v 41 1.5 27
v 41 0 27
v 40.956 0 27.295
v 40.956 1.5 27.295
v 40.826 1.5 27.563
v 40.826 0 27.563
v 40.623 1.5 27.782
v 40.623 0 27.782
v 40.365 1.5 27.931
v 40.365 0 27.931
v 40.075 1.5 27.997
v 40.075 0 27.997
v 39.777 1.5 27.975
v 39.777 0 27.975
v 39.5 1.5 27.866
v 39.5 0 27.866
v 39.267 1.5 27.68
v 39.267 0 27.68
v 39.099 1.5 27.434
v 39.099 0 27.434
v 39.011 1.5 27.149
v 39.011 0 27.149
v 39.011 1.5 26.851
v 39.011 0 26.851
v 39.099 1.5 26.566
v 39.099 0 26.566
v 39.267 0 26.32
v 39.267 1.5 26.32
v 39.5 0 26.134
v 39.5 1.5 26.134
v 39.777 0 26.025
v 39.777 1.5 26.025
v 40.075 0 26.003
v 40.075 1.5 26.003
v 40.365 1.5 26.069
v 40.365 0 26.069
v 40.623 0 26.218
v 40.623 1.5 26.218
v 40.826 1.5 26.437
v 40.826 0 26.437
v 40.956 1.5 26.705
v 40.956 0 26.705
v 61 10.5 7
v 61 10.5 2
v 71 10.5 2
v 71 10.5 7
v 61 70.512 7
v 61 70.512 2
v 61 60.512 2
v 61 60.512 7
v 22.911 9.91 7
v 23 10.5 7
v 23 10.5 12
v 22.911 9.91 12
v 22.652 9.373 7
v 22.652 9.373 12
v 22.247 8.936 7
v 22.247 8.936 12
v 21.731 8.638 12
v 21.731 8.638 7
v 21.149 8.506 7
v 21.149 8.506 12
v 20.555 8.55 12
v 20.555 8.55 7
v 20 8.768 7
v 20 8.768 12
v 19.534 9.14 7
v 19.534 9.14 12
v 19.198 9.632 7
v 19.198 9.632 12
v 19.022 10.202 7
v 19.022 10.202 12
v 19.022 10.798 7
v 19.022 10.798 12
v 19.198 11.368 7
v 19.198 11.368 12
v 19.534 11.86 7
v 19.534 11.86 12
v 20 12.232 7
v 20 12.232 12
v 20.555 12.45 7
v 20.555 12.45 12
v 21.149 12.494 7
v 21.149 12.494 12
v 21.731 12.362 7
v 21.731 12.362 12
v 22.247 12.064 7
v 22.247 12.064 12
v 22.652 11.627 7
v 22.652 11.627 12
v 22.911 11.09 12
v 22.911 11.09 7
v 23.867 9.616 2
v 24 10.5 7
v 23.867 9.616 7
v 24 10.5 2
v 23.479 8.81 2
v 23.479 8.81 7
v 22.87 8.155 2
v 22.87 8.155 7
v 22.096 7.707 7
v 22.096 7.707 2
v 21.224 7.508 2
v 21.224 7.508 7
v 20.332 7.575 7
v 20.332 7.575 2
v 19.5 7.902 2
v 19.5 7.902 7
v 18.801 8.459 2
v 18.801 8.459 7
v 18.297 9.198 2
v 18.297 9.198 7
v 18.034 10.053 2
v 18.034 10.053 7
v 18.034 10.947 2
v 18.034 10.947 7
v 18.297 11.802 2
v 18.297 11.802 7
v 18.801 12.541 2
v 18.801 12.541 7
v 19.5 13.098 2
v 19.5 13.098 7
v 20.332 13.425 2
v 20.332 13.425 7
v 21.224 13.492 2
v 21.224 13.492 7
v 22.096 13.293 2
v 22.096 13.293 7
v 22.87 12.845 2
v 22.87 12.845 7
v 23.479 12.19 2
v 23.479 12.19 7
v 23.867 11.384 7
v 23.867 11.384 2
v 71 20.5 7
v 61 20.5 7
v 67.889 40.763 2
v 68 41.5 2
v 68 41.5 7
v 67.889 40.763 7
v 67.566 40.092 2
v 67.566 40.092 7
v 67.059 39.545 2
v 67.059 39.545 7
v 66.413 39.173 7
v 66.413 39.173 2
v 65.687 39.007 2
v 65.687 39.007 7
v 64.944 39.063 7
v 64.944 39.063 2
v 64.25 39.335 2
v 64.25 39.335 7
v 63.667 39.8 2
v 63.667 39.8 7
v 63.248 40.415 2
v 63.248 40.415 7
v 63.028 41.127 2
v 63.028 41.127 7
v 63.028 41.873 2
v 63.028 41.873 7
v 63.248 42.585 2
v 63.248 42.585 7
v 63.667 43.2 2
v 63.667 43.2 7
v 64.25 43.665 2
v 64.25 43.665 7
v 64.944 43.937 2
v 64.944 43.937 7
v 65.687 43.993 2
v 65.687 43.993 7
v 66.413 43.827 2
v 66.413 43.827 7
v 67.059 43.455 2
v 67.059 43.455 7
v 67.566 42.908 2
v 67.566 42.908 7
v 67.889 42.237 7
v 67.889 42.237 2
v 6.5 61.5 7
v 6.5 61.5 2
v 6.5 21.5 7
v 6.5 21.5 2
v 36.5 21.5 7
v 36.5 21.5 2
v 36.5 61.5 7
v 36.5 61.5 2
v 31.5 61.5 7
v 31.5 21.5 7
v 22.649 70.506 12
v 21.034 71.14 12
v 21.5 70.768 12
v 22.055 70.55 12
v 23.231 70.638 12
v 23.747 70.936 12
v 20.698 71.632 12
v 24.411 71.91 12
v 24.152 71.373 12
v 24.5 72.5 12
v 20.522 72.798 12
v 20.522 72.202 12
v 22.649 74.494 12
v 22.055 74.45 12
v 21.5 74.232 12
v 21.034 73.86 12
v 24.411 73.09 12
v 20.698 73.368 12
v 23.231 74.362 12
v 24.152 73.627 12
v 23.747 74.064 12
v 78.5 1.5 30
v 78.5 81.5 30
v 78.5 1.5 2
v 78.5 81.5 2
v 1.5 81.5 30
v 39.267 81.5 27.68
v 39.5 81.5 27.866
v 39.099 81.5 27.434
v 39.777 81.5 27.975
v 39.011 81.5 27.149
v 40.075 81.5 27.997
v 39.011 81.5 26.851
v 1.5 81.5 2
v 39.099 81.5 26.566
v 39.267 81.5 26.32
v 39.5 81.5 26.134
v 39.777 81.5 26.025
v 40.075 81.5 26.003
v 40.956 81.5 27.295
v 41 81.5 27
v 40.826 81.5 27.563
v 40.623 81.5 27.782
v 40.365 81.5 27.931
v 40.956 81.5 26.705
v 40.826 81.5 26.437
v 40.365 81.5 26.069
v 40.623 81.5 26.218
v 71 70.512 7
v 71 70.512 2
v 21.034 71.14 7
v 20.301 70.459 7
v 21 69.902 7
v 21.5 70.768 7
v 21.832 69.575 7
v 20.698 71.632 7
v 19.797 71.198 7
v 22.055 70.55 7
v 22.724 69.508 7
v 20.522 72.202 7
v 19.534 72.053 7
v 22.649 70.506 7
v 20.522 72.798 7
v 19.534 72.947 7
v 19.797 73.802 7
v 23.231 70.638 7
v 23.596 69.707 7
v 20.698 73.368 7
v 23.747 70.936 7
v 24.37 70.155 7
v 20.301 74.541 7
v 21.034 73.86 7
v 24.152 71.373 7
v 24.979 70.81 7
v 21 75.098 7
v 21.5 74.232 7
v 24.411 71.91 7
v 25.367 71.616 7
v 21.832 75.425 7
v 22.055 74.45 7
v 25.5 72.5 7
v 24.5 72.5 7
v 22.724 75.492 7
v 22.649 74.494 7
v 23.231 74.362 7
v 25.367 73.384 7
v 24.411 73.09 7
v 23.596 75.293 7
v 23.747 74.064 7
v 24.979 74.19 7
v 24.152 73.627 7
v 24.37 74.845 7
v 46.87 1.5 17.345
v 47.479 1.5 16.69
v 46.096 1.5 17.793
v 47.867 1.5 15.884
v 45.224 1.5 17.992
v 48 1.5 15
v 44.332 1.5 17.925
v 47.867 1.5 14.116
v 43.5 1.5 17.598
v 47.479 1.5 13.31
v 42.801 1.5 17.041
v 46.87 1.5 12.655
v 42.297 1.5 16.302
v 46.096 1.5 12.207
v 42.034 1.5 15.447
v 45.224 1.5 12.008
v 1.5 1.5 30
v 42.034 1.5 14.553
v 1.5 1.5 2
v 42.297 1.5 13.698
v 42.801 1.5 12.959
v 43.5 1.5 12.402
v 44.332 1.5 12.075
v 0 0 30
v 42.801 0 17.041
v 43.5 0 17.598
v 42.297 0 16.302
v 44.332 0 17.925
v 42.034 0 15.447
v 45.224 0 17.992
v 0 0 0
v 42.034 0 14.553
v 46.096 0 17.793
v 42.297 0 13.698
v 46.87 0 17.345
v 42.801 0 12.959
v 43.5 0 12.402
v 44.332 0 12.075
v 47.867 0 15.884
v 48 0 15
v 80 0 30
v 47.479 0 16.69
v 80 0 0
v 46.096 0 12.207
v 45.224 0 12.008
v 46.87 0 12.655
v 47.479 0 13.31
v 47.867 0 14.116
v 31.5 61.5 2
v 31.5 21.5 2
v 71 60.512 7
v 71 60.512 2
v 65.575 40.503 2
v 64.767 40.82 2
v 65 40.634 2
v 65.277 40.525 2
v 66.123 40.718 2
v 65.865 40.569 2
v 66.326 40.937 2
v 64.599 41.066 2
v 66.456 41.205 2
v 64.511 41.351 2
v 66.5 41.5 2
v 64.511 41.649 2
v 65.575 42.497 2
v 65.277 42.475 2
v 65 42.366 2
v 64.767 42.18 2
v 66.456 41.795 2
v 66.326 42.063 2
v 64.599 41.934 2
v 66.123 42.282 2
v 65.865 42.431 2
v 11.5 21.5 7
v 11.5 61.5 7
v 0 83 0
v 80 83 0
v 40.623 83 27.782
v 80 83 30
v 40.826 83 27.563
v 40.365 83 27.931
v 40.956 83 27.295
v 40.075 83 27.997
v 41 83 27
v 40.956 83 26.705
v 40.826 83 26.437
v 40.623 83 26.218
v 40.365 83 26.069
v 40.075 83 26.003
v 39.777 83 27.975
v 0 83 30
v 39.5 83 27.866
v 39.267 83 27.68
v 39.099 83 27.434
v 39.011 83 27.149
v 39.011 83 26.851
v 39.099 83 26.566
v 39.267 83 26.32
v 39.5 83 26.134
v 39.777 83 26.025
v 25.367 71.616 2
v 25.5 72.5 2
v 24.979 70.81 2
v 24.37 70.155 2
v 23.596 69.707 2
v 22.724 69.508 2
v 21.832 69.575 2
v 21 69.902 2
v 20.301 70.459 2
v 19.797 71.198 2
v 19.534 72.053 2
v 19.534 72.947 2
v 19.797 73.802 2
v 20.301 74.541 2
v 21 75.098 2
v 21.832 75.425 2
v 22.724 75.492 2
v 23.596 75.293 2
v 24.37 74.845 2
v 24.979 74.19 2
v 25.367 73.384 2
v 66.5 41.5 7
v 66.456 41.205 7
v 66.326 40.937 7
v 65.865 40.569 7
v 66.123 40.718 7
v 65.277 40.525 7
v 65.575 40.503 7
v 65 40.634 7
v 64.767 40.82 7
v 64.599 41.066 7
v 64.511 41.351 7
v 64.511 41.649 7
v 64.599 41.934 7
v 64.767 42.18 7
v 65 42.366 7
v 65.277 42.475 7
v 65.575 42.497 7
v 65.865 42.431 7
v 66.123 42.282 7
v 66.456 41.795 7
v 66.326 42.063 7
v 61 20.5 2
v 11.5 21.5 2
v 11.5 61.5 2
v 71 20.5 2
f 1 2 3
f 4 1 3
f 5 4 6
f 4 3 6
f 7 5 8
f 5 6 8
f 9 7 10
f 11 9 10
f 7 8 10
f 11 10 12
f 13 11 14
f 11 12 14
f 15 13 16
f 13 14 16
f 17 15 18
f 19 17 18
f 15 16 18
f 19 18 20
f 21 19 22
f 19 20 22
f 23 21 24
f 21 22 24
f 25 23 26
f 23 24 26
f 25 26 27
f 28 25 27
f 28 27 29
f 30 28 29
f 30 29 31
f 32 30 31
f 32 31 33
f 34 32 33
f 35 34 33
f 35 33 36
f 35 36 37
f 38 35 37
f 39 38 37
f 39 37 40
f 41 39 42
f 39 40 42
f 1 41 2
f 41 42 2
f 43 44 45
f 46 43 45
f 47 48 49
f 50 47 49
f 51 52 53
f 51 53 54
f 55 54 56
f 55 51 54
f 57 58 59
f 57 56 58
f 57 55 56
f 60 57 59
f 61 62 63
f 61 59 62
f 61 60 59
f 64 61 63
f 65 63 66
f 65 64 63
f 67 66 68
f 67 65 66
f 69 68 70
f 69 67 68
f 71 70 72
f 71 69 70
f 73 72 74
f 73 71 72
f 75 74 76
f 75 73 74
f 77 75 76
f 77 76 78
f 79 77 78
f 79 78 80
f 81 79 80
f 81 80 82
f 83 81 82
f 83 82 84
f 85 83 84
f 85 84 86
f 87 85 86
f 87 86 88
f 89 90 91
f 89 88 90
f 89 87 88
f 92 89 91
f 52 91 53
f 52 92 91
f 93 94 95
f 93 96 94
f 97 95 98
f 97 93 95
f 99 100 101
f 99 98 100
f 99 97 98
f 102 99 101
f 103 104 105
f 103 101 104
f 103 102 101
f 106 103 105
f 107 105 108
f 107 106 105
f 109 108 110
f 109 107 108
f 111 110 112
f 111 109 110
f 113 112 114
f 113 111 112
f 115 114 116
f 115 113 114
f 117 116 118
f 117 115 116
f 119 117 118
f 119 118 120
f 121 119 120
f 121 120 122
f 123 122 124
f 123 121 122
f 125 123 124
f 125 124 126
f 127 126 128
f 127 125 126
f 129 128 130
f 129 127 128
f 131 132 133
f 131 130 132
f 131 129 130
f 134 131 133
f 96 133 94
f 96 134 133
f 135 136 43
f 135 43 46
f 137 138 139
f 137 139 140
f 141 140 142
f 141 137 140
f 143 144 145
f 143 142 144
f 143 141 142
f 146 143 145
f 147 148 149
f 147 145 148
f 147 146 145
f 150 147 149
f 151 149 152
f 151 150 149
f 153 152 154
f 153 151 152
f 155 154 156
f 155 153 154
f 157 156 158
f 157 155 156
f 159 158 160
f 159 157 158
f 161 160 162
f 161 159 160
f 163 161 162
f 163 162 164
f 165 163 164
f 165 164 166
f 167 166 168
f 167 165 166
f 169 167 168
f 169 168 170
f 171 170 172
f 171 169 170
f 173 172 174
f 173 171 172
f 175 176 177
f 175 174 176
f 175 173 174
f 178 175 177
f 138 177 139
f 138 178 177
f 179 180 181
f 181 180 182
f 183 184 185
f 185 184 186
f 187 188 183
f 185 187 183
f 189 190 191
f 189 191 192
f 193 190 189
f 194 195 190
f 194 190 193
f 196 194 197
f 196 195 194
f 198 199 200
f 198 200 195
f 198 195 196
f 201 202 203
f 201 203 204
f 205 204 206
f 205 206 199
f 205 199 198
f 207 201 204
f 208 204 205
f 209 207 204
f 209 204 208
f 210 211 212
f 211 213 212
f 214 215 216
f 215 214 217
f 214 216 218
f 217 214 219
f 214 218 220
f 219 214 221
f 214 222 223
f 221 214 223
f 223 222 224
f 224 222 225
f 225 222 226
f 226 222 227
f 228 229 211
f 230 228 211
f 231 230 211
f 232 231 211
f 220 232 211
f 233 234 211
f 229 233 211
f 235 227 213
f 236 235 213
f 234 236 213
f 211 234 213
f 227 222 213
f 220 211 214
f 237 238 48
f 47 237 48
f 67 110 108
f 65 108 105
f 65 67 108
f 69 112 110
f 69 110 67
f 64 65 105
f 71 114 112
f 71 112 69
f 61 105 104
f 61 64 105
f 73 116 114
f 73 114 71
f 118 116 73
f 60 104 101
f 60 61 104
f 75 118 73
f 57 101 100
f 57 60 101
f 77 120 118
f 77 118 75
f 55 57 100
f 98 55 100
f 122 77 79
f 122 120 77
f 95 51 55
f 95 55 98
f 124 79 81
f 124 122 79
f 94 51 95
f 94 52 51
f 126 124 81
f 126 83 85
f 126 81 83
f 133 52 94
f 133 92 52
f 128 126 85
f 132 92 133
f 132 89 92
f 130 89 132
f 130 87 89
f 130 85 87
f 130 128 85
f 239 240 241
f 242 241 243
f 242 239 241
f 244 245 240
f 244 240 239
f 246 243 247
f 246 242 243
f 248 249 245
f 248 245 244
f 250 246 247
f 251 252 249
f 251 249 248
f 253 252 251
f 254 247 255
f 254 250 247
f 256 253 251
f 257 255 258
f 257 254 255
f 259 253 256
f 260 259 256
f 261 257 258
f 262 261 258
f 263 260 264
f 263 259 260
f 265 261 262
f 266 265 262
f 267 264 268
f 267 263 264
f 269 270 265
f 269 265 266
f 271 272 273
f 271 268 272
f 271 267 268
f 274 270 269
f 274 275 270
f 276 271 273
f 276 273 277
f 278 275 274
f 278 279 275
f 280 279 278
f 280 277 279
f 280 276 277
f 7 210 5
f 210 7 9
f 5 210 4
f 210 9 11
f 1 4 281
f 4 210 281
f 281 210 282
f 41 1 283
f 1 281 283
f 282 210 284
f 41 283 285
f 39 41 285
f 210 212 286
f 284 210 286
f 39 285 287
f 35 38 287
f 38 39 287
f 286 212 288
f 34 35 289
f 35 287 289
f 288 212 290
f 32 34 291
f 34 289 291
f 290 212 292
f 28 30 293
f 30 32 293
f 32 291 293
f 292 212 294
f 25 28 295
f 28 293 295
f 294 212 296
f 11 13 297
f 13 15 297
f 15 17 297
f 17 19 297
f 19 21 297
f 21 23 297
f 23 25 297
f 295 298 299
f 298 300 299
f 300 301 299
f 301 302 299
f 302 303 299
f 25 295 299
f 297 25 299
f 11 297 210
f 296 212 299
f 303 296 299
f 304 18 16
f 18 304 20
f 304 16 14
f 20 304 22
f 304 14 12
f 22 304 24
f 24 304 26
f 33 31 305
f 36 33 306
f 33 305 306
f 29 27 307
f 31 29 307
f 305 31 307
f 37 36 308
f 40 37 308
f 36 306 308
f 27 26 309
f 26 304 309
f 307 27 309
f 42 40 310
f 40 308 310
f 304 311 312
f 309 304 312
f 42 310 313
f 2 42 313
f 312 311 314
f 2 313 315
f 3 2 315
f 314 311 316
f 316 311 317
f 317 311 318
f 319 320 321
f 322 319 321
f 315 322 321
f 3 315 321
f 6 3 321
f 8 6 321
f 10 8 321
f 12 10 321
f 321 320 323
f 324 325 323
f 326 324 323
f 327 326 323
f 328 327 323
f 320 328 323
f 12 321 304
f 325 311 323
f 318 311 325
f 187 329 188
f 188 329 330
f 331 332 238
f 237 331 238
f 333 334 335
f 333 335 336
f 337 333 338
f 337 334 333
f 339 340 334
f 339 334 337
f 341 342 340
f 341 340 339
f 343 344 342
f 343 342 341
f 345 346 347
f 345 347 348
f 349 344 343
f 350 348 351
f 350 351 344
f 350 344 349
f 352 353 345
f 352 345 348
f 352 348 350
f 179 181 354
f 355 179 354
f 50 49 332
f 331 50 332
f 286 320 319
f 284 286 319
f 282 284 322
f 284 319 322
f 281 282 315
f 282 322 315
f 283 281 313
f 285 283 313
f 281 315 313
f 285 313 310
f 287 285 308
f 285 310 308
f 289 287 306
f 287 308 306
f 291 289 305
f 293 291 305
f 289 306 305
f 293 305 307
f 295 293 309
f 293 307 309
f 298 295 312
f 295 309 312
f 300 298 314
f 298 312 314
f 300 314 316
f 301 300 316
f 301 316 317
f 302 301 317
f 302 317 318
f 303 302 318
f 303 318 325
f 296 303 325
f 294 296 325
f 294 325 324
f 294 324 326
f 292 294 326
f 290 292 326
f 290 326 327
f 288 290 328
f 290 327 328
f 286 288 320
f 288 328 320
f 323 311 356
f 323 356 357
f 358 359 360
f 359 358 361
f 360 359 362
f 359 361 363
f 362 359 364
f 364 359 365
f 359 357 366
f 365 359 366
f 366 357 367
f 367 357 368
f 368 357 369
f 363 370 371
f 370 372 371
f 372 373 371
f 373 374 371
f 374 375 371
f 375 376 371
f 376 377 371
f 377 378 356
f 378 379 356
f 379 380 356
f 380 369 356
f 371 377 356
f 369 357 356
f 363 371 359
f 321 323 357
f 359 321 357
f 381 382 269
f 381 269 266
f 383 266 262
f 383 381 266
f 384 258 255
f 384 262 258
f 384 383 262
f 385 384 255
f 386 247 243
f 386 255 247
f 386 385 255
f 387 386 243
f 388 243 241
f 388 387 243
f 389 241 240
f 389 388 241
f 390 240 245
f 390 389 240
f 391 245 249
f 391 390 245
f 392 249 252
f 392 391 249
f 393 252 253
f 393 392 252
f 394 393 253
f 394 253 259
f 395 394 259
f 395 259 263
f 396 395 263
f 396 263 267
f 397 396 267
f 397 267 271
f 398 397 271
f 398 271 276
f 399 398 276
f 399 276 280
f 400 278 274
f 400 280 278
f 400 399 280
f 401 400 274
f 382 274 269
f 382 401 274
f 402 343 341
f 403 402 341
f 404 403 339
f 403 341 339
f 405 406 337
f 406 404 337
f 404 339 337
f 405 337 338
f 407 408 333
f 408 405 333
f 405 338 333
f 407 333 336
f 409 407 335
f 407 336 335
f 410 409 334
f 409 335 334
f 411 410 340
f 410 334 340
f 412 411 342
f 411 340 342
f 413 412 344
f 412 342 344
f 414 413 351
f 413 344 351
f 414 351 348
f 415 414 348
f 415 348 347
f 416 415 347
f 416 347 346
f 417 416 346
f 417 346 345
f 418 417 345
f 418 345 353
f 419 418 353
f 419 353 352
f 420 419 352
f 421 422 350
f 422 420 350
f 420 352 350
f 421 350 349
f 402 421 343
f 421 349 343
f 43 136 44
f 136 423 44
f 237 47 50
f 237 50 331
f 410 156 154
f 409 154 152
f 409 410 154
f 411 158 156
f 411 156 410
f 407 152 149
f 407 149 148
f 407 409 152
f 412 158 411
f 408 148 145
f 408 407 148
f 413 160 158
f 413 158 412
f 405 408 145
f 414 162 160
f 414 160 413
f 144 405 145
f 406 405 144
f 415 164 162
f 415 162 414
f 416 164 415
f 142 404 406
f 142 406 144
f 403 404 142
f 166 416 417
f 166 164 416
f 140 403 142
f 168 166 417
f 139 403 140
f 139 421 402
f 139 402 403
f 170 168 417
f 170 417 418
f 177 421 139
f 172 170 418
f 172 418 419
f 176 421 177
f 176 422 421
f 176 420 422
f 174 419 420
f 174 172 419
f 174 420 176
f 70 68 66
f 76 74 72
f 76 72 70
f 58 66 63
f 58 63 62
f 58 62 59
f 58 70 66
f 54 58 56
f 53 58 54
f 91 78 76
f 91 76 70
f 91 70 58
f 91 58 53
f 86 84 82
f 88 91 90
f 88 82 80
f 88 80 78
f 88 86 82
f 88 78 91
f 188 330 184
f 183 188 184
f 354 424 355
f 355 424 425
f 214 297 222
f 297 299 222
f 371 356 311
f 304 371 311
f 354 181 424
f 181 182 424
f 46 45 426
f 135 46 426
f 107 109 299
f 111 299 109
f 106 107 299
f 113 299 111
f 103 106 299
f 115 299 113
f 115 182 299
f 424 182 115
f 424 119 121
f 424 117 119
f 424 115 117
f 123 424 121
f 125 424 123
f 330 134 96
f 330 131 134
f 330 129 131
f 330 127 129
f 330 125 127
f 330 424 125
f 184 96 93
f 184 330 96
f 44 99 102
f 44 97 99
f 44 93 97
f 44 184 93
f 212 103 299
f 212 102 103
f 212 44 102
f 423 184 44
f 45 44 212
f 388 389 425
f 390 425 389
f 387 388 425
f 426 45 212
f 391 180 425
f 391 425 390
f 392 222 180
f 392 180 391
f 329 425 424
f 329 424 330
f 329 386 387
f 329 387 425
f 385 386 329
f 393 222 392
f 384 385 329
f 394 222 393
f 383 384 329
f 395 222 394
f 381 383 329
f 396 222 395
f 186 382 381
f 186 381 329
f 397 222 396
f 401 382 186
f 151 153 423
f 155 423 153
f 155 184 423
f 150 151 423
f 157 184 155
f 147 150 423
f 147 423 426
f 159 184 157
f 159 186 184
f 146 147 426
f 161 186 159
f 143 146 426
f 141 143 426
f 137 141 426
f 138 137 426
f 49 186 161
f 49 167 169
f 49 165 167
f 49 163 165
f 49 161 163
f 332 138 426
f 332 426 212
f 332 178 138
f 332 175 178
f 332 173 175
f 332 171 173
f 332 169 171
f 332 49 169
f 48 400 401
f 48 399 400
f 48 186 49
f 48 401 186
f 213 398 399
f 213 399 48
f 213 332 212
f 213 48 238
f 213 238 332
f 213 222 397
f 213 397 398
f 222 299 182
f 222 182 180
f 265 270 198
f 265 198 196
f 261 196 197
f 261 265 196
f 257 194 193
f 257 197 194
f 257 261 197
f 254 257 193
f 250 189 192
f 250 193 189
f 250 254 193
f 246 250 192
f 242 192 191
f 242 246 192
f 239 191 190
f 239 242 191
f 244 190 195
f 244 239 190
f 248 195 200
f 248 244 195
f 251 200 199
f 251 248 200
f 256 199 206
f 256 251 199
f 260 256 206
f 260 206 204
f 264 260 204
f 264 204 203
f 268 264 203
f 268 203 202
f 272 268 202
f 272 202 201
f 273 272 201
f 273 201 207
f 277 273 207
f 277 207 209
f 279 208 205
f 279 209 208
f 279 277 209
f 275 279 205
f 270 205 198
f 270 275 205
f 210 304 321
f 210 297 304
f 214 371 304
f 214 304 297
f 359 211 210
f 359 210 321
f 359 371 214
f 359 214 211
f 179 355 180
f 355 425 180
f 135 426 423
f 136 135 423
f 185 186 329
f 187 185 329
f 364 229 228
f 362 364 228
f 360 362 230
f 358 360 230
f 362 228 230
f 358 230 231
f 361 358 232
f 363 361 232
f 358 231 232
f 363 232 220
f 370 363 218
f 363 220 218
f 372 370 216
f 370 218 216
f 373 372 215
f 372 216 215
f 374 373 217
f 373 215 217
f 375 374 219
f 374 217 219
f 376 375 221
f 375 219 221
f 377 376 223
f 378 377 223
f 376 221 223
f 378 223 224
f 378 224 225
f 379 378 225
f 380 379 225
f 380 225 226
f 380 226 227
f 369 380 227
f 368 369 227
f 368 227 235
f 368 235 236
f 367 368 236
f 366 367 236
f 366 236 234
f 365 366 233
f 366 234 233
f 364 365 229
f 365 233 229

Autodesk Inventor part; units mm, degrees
ref_plane "YZ Plane" through (0, 0, 0) normal (1, 0, 0) x (0, 1, 0)
ref_plane "XZ Plane" through (0, 0, 0) normal (0, 1, 0) x (-1, 0, 0)
ref_plane "XY Plane" through (0, 0, 0) normal (0, 0, 1) x (1, 0, 0)
sketch "Skizze1" plane through (0, 0, 0) normal (0, 0, 1) x (1, 0, 0)
  line L0 (0, 0) -> (80, 0)
  line L1 (80, 0) -> (80, 83)
  line L2 (80, 83) -> (0, 83)
  line L3 (0, 83) -> (0, 0)
  line L4 (1.5, 81.5) -> (78.5, 81.5)
  line L5 (78.5, 81.5) -> (78.5, 1.5)
  line L6 (78.5, 1.5) -> (1.5, 1.5)
  line L7 (1.5, 1.5) -> (1.5, 81.5)
  dimension "d0" = 80
  dimension "d1" = 83
  dimension "d2" = 1.5
  dimension "d3" = 1.5
  dimension "d4" = 1.5
  dimension "d5" = 1.5
extrude "Extrusion1" add sketch "Skizze1" along normal blind 2 contours L4 L5 L6 L7
extrude "Extrusion2" add sketch "Skizze1" along normal blind 30
sketch "Skizze2" plane through (0, 0, 2) normal (0, 0, 1) x (1, 0, 0)
  circle A0 centre (22.5, 72.5) radius 3
  circle A1 centre (21, 10.5) radius 3
  line L0 (1.5, 1.5) -> (1.5, 81.5) projected
  circle A2 centre (22.5, 72.5) radius 2
  circle A3 centre (21, 10.5) radius 2
  circle A4 centre (65.5, 41.5) radius 1
  circle A5 centre (65.5, 41.5) radius 2.5
  line L1 (78.5, 81.5) -> (78.5, 1.5) projected
  line L2 (78.5, 1.5) -> (1.5, 1.5) projected
  line L3 (1.5, 81.5) -> (78.5, 81.5) projected
  line L4 (31.5, 21.5) -> (36.5, 21.5)
  line L5 (36.5, 21.5) -> (36.5, 61.5)
  line L6 (36.5, 61.5) -> (31.5, 61.5)
  line L7 (31.5, 61.5) -> (31.5, 21.5)
  line L8 (6.5, 21.5) -> (11.5, 21.5)
  line L9 (11.5, 21.5) -> (11.5, 61.5)
  line L10 (11.5, 61.5) -> (6.5, 61.5)
  line L11 (6.5, 61.5) -> (6.5, 21.5)
  line L12 (61, 10.5) -> (71, 10.5)
  line L13 (71, 10.5) -> (71, 20.5)
  line L14 (71, 20.5) -> (61, 20.5)
  line L15 (61, 20.5) -> (61, 10.5)
  line L16 (61, 60.5117) -> (71, 60.5117)
  line L17 (71, 60.5117) -> (71, 70.5117)
  line L18 (71, 70.5117) -> (61, 70.5117)
  line L19 (61, 70.5117) -> (61, 60.5117)
  point P0 (0, 0)
  point P1 (71, 65.5117)
  dimension "d11" = 21
  dimension "d12" = 19.5
  dimension "d13" = 4
  dimension "d14" = 4
  dimension "d15" = 6
  dimension "d16" = 6
  dimension "d17" = 2
  dimension "d18" = 5
  dimension "d23" = 13
  dimension "d31" = 62
  dimension "d32" = 9
  dimension "d33" = 9
  dimension "d44" = 5
  dimension "d45" = 40
  dimension "d46" = 30
  dimension "d47" = 20
  dimension "d48" = 20
  dimension "d49" = 5
  dimension "d50" = 40
  dimension "d51" = 20
  dimension "d52" = 5
  dimension "d53" = 10
  dimension "d54" = 10
  dimension "d55" = 10
  dimension "d56" = 10
  dimension "d57" = 7.5
  dimension "d58" = 7.5
extrude "Extrusion3" add sketch "Skizze2" along normal blind 5 contours A0 | A1 | A5 | L7 L6 L5 L4 | L11 L10 L9 L8 | L15 L14 L13 L12 | L19 L18 L17 L16
extrude "Extrusion4" add sketch "Skizze2" along normal blind 10 contours A2 | A3
sketch "Skizze4" plane through (0, 0, 0) normal (0, -1, 0) x (1, 0, 0)
  circle A0 centre (40, 27) radius 1
  line L0 (0, 30) -> (80, 30) projected
  line L1 (0, 0) -> (0, 30) projected
  dimension "d34" = 2
  dimension "d35" = 3
  dimension "d36" = 40
extrude "Extrusion6" cut sketch "Skizze4" against normal through all
sketch "Skizze5" plane through (0, 0, 0) normal (0, -1, 0) x (1, 0, 0)
  circle A0 centre (45, 15) radius 3
  line L0 (0, 0) -> (0, 30) projected
  line L1 (0, 30) -> (80, 30) projected
  dimension "d39" = 6
  dimension "d40" = 45
  dimension "d41" = 15
extrude "Extrusion7" cut sketch "Skizze5" against normal blind 5
properties part number "Gyrosensor"
